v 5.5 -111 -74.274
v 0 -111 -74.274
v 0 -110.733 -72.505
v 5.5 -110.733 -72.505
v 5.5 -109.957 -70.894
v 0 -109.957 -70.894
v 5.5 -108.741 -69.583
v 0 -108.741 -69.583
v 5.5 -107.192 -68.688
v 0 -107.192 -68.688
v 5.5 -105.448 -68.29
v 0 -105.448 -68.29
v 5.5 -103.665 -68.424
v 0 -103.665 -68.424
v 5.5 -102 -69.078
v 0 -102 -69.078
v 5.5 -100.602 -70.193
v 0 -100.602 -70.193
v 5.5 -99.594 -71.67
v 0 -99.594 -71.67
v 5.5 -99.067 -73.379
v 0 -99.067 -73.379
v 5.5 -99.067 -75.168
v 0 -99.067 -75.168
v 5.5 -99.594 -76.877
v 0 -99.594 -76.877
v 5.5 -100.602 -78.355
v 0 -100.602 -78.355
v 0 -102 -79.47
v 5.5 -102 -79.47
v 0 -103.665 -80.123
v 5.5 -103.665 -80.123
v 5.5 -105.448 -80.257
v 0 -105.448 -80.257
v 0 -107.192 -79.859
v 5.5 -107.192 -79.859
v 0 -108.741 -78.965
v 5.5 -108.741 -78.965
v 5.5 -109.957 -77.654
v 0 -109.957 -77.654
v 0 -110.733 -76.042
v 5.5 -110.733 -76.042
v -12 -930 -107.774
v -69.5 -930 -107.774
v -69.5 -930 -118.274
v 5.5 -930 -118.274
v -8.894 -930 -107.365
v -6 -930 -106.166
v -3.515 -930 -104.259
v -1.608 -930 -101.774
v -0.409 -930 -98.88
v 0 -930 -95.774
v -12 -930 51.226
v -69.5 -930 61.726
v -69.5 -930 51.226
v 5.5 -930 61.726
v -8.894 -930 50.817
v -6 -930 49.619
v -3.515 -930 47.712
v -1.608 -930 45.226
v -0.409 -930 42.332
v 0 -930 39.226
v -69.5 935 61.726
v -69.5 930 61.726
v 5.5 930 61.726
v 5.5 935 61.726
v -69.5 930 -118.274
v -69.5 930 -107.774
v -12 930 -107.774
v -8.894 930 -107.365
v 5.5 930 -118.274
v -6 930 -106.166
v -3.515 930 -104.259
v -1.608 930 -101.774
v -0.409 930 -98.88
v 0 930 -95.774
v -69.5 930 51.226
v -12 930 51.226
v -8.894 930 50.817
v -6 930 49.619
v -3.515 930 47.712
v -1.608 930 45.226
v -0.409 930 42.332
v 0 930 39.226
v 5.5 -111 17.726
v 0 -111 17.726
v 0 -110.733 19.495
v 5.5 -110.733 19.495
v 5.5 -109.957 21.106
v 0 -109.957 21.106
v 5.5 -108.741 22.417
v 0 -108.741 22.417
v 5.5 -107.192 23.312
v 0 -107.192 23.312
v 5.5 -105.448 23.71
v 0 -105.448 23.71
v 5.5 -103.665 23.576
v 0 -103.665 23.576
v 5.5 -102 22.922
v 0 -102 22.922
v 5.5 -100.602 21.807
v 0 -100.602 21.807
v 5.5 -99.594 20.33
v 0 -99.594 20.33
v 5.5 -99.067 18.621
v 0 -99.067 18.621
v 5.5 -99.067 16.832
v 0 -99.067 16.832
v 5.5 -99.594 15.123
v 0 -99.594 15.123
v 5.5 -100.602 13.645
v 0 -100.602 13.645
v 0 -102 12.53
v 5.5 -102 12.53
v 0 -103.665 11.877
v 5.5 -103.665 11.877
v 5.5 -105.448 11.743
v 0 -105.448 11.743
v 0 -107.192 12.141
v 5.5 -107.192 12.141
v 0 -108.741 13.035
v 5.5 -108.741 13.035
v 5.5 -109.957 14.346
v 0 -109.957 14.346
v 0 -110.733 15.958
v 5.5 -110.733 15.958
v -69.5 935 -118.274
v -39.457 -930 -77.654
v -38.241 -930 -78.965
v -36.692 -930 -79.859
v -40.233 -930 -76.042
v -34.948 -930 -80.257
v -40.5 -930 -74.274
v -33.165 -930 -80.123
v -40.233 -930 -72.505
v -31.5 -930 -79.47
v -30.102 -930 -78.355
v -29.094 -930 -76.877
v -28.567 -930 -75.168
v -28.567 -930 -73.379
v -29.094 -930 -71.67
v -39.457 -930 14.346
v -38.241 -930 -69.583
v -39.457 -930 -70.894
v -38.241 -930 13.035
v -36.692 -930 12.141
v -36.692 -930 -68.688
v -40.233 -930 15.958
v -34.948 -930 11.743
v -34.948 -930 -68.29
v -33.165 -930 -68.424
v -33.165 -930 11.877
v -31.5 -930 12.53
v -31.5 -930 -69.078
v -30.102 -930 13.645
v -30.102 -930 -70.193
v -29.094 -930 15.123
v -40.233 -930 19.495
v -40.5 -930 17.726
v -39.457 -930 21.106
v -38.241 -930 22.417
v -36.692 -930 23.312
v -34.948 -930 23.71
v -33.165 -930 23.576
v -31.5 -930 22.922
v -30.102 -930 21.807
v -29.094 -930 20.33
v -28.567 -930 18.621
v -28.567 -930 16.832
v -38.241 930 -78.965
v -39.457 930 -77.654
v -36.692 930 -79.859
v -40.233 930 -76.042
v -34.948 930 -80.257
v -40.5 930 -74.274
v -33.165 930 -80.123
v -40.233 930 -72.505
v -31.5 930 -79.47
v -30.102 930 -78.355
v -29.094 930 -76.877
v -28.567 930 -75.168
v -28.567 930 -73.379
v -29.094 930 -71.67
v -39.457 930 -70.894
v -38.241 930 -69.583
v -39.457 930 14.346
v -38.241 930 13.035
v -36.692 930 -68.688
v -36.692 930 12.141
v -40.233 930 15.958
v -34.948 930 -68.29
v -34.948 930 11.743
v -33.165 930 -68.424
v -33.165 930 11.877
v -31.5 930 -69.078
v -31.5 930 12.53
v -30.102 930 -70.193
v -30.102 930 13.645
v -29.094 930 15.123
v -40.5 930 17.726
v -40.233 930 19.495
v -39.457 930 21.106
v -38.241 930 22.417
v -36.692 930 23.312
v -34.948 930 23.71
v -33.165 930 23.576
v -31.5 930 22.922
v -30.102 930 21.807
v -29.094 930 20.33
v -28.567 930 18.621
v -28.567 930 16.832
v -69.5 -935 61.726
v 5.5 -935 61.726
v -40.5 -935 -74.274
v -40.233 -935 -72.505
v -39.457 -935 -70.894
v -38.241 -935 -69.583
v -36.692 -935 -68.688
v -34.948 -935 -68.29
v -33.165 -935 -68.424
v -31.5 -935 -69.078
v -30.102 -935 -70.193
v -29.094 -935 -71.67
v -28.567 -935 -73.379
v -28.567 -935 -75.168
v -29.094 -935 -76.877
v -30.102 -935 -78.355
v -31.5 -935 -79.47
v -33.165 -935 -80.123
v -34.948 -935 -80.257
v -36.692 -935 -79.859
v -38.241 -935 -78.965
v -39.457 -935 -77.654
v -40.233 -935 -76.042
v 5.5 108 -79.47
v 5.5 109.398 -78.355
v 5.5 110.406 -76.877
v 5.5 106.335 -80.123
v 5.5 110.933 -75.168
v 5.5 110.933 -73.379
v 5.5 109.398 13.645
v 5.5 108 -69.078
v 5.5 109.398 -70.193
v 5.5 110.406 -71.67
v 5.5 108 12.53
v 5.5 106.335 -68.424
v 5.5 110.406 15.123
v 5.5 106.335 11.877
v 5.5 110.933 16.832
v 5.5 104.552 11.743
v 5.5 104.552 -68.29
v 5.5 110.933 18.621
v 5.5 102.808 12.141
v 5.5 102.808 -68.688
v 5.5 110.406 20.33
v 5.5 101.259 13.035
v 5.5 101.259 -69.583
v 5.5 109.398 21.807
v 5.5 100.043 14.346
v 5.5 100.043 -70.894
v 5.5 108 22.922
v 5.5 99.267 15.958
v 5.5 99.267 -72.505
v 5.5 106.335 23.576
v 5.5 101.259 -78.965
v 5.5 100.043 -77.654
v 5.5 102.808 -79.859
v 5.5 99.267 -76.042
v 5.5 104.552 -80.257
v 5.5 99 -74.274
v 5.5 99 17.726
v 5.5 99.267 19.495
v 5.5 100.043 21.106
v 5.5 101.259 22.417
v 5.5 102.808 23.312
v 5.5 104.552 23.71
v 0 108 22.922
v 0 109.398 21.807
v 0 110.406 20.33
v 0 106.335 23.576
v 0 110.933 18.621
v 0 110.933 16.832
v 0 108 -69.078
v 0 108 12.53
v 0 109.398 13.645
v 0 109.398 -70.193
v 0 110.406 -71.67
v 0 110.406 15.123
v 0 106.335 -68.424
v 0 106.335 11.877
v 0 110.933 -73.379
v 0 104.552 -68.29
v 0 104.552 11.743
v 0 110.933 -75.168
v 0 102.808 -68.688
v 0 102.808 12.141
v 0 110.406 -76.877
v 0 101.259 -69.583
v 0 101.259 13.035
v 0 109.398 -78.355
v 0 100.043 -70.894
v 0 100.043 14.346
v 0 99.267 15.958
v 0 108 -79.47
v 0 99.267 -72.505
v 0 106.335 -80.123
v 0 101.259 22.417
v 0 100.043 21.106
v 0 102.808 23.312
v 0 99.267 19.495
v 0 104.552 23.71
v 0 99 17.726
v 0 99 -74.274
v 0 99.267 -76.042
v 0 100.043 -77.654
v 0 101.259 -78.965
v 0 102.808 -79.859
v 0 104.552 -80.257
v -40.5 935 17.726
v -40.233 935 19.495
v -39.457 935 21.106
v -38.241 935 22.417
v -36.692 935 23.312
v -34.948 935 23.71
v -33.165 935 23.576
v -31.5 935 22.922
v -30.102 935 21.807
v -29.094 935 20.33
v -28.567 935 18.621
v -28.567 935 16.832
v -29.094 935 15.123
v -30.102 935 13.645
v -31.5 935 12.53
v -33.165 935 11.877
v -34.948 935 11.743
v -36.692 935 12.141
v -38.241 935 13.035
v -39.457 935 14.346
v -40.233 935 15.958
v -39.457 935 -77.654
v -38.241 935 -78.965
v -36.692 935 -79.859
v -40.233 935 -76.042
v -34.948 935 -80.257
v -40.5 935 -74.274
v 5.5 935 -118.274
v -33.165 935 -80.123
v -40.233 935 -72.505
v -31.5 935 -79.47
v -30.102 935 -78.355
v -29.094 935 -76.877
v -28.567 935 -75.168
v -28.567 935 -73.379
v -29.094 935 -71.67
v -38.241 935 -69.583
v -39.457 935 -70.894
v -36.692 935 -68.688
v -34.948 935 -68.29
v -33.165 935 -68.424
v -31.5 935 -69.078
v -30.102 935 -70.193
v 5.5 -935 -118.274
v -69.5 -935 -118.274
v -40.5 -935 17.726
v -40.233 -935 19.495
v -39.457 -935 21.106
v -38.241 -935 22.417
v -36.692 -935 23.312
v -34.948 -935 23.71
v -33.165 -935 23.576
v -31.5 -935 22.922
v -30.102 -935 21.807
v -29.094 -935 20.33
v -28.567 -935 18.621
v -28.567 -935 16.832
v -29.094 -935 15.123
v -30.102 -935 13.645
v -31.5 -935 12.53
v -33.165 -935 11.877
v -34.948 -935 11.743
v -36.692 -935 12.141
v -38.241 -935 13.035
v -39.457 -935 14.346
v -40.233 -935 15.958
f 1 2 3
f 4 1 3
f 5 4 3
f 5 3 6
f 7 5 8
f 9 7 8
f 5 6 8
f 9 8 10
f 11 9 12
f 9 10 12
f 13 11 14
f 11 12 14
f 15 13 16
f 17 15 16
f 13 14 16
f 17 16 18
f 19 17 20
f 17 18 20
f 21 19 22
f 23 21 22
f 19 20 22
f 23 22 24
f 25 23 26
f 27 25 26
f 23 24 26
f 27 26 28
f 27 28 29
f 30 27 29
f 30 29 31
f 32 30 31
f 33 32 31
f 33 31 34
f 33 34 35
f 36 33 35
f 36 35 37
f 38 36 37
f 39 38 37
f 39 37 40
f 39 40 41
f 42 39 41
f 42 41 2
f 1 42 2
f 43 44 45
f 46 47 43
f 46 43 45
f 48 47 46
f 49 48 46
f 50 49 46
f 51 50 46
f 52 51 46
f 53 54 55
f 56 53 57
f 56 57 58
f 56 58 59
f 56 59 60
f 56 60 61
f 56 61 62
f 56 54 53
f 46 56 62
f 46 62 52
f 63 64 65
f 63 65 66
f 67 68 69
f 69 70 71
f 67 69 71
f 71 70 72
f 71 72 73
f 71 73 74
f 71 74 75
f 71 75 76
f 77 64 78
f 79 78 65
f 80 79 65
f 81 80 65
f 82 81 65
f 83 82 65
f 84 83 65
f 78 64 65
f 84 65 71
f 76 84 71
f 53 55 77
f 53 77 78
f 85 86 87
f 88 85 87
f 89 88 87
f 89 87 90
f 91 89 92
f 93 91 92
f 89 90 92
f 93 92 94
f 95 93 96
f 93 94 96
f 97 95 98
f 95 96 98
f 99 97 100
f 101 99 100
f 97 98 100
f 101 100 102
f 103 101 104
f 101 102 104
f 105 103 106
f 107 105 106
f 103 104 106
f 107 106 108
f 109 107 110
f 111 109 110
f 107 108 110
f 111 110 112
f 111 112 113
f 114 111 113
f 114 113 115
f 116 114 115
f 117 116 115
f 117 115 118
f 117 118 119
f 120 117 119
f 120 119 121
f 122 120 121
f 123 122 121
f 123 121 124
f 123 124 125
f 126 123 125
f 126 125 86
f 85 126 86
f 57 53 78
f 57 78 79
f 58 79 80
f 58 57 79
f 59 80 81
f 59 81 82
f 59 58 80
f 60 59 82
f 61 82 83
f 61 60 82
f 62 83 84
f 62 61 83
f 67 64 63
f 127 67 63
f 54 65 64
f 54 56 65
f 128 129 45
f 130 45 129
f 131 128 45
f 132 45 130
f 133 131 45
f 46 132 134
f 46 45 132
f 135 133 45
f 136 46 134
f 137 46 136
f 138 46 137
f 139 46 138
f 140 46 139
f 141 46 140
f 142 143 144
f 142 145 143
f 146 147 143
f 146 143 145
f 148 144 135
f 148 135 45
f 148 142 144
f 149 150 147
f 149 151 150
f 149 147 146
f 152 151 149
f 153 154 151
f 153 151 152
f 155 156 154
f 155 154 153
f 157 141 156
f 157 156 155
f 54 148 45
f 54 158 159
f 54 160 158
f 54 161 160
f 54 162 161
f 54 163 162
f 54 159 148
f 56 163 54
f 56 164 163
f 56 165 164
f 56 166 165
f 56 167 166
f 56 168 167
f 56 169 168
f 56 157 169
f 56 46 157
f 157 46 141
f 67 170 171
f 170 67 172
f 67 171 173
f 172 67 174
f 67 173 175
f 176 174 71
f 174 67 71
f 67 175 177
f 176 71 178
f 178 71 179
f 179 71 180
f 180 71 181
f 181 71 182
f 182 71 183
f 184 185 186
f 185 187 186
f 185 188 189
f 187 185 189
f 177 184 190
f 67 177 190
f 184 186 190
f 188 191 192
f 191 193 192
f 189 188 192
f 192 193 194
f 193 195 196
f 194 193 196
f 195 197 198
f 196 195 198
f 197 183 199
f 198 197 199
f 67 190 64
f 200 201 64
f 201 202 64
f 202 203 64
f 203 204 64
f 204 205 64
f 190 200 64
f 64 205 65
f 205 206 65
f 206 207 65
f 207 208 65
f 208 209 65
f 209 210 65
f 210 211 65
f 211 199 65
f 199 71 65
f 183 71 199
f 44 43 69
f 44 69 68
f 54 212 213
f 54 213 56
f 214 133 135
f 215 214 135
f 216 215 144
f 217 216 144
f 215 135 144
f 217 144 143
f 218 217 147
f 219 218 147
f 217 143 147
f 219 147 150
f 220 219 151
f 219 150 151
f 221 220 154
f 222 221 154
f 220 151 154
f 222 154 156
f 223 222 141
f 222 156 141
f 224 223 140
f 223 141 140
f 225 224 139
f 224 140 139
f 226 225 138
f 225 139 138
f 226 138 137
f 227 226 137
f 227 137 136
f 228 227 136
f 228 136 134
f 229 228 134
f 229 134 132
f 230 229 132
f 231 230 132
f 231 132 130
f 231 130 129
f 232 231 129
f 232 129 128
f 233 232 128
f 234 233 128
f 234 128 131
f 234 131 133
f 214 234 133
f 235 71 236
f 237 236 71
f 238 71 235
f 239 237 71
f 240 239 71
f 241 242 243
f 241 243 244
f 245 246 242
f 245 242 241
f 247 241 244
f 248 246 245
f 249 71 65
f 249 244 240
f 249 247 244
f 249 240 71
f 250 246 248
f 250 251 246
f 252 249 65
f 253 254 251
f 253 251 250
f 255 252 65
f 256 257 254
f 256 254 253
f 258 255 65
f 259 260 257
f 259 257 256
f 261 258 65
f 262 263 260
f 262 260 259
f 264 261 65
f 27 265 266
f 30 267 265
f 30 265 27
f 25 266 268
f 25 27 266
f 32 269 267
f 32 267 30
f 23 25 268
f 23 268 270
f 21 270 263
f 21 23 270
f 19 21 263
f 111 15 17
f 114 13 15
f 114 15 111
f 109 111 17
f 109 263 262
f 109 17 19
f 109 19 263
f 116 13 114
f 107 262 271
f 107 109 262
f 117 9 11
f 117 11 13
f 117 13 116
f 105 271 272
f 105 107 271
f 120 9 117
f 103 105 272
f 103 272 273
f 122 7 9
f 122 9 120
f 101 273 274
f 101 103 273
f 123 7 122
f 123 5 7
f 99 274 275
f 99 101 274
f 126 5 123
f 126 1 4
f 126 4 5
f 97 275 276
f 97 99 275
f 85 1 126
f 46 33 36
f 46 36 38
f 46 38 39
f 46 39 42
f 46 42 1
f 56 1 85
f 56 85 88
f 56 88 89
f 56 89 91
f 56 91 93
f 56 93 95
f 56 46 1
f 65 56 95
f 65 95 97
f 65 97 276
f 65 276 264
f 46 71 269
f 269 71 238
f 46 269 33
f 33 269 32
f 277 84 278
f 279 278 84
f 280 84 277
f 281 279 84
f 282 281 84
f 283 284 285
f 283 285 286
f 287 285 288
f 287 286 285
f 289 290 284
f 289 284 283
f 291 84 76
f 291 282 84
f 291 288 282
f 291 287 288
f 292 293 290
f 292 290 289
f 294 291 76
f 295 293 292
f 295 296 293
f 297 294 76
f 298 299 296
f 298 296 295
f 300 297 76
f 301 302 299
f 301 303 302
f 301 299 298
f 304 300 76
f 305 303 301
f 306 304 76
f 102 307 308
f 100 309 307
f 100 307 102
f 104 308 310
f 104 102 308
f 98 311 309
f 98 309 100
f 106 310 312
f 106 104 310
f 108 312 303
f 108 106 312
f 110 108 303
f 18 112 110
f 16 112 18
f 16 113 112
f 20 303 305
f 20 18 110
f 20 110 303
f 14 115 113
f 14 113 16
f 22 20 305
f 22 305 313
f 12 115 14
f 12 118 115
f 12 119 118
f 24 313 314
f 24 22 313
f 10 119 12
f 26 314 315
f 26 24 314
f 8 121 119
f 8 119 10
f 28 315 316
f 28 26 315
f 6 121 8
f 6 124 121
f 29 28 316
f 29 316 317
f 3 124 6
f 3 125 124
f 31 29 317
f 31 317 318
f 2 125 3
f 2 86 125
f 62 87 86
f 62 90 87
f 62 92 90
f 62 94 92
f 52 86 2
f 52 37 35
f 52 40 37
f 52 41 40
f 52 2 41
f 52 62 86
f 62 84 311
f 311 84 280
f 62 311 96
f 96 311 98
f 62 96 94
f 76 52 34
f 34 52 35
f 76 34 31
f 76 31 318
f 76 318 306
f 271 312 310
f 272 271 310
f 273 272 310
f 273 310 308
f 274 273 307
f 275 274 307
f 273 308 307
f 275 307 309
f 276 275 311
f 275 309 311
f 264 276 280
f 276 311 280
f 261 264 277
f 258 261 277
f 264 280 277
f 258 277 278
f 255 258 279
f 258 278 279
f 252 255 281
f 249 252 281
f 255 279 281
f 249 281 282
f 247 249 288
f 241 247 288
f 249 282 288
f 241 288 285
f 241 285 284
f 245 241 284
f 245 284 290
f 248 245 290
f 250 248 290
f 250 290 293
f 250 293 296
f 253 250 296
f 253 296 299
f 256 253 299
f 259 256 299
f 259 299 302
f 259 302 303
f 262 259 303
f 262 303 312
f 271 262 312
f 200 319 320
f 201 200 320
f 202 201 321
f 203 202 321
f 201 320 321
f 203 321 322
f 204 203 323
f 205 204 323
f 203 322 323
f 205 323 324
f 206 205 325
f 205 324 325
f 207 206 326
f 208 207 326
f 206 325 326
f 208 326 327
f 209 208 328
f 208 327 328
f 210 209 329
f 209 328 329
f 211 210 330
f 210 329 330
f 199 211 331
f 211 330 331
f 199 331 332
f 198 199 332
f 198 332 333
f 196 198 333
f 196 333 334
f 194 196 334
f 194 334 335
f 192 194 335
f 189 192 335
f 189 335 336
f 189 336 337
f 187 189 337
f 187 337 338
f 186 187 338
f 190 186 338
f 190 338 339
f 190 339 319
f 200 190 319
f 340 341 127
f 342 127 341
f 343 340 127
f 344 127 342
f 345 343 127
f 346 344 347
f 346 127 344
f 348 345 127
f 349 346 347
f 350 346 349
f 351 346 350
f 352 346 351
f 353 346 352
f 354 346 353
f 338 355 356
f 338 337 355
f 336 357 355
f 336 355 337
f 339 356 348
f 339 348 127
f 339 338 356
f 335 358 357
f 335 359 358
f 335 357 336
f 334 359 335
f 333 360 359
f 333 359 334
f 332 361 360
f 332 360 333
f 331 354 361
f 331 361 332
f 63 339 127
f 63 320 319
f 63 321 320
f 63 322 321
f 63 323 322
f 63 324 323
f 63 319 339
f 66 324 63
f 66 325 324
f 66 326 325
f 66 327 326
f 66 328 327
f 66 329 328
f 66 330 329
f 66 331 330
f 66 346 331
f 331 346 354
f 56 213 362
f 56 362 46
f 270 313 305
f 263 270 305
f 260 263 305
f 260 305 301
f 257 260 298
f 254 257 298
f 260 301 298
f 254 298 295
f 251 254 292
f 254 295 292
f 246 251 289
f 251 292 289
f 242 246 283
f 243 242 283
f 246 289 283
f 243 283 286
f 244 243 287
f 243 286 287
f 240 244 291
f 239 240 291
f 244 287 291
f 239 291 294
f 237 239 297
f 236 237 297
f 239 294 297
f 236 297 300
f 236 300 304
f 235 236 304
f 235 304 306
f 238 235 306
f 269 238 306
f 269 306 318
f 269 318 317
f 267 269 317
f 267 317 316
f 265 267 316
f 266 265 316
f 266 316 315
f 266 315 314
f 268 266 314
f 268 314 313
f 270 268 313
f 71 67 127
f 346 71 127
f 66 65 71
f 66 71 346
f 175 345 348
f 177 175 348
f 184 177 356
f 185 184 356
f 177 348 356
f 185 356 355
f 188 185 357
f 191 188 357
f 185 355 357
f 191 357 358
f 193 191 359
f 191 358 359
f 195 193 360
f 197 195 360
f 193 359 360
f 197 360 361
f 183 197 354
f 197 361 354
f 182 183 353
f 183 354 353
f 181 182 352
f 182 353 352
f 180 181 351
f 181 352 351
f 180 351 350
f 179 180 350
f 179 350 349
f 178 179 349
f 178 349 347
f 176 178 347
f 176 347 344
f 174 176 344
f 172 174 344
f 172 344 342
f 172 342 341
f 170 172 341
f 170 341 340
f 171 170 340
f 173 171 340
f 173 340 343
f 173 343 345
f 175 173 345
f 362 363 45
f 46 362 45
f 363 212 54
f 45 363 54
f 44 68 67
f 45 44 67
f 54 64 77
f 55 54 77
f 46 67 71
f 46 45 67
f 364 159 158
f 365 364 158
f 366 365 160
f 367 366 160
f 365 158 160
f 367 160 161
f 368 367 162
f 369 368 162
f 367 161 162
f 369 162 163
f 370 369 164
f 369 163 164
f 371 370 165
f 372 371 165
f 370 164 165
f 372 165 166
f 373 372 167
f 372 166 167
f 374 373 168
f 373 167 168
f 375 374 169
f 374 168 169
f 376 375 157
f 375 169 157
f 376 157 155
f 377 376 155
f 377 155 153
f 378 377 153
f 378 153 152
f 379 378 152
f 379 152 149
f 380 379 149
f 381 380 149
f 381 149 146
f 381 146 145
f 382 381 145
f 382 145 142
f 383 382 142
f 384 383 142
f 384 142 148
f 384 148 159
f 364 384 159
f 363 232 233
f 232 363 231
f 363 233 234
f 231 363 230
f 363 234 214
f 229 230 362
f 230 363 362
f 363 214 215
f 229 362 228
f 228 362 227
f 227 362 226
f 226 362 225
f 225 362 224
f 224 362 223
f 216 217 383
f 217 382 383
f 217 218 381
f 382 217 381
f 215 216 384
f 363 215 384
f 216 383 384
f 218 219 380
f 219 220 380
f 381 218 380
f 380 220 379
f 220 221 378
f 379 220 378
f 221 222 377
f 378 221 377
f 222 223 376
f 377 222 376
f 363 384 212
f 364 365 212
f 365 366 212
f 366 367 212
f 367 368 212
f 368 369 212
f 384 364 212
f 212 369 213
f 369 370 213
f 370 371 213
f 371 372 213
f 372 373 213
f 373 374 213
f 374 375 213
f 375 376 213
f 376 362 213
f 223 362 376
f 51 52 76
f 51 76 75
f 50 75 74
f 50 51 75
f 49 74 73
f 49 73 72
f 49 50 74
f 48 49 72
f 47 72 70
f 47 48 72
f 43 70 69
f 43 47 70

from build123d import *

# Parameters (mm, degrees)
F1_DEPTH = 930
F2_W     = 5
F2_H     = 180
F3_DEPTH = 75
F5_D     = 12
F7_D     = 12


with BuildPart() as f1:
    # F0 (on Front) → F1 (new body, symmetric)
    with BuildSketch(Plane.XZ):
        with BuildLine():
            Line((5.5, 61.726318), (-69.5, 61.726318))
            Line((-69.5, 61.726318), (-69.5, 51.226318))
            Line((-69.5, 51.226318), (-12, 51.226318))
            ThreePointArc((-12, 51.226318), (-3.514719, 47.711599), (0, 39.226318))
            Line((0, 39.226318), (0, -95.773682))
            ThreePointArc((0, -95.773682), (-3.514719, -104.258963), (-12, -107.773682))
            Line((-12, -107.773682), (-69.5, -107.773682))
            Line((-69.5, -107.773682), (-69.5, -118.273682))
            Line((-69.5, -118.273682), (5.5, -118.273682))
            Line((5.5, -118.273682), (5.5, 61.726318))
        make_face()
    extrude(amount=F1_DEPTH, both=True)

    # F7 (through all)
    with Locations(Plane.YZ.offset(5.5)):
        with Locations((-105, 17.726318), (105, 17.726318), (105, -74.273682), (-105, -74.273682)):
            Hole(F7_D / 2)


with BuildPart() as f3:
    # F2 (on face) → F3 (new body)
    with BuildSketch(Plane.YZ.offset(5.5)):
        with Locations((932.5, -28.273682)):
            Rectangle(F2_W, F2_H)
        with Locations((-932.5, -28.273682)):
            Rectangle(F2_W, F2_H)
    extrude(amount=-F3_DEPTH)

    # F5 (through all)
    with Locations(Plane.XZ.offset(935)):
        with Locations((-34.5, 17.726318), (-34.5, -74.273682)):
            Hole(F5_D / 2)


solid = Compound([f1.part, f3.part])
